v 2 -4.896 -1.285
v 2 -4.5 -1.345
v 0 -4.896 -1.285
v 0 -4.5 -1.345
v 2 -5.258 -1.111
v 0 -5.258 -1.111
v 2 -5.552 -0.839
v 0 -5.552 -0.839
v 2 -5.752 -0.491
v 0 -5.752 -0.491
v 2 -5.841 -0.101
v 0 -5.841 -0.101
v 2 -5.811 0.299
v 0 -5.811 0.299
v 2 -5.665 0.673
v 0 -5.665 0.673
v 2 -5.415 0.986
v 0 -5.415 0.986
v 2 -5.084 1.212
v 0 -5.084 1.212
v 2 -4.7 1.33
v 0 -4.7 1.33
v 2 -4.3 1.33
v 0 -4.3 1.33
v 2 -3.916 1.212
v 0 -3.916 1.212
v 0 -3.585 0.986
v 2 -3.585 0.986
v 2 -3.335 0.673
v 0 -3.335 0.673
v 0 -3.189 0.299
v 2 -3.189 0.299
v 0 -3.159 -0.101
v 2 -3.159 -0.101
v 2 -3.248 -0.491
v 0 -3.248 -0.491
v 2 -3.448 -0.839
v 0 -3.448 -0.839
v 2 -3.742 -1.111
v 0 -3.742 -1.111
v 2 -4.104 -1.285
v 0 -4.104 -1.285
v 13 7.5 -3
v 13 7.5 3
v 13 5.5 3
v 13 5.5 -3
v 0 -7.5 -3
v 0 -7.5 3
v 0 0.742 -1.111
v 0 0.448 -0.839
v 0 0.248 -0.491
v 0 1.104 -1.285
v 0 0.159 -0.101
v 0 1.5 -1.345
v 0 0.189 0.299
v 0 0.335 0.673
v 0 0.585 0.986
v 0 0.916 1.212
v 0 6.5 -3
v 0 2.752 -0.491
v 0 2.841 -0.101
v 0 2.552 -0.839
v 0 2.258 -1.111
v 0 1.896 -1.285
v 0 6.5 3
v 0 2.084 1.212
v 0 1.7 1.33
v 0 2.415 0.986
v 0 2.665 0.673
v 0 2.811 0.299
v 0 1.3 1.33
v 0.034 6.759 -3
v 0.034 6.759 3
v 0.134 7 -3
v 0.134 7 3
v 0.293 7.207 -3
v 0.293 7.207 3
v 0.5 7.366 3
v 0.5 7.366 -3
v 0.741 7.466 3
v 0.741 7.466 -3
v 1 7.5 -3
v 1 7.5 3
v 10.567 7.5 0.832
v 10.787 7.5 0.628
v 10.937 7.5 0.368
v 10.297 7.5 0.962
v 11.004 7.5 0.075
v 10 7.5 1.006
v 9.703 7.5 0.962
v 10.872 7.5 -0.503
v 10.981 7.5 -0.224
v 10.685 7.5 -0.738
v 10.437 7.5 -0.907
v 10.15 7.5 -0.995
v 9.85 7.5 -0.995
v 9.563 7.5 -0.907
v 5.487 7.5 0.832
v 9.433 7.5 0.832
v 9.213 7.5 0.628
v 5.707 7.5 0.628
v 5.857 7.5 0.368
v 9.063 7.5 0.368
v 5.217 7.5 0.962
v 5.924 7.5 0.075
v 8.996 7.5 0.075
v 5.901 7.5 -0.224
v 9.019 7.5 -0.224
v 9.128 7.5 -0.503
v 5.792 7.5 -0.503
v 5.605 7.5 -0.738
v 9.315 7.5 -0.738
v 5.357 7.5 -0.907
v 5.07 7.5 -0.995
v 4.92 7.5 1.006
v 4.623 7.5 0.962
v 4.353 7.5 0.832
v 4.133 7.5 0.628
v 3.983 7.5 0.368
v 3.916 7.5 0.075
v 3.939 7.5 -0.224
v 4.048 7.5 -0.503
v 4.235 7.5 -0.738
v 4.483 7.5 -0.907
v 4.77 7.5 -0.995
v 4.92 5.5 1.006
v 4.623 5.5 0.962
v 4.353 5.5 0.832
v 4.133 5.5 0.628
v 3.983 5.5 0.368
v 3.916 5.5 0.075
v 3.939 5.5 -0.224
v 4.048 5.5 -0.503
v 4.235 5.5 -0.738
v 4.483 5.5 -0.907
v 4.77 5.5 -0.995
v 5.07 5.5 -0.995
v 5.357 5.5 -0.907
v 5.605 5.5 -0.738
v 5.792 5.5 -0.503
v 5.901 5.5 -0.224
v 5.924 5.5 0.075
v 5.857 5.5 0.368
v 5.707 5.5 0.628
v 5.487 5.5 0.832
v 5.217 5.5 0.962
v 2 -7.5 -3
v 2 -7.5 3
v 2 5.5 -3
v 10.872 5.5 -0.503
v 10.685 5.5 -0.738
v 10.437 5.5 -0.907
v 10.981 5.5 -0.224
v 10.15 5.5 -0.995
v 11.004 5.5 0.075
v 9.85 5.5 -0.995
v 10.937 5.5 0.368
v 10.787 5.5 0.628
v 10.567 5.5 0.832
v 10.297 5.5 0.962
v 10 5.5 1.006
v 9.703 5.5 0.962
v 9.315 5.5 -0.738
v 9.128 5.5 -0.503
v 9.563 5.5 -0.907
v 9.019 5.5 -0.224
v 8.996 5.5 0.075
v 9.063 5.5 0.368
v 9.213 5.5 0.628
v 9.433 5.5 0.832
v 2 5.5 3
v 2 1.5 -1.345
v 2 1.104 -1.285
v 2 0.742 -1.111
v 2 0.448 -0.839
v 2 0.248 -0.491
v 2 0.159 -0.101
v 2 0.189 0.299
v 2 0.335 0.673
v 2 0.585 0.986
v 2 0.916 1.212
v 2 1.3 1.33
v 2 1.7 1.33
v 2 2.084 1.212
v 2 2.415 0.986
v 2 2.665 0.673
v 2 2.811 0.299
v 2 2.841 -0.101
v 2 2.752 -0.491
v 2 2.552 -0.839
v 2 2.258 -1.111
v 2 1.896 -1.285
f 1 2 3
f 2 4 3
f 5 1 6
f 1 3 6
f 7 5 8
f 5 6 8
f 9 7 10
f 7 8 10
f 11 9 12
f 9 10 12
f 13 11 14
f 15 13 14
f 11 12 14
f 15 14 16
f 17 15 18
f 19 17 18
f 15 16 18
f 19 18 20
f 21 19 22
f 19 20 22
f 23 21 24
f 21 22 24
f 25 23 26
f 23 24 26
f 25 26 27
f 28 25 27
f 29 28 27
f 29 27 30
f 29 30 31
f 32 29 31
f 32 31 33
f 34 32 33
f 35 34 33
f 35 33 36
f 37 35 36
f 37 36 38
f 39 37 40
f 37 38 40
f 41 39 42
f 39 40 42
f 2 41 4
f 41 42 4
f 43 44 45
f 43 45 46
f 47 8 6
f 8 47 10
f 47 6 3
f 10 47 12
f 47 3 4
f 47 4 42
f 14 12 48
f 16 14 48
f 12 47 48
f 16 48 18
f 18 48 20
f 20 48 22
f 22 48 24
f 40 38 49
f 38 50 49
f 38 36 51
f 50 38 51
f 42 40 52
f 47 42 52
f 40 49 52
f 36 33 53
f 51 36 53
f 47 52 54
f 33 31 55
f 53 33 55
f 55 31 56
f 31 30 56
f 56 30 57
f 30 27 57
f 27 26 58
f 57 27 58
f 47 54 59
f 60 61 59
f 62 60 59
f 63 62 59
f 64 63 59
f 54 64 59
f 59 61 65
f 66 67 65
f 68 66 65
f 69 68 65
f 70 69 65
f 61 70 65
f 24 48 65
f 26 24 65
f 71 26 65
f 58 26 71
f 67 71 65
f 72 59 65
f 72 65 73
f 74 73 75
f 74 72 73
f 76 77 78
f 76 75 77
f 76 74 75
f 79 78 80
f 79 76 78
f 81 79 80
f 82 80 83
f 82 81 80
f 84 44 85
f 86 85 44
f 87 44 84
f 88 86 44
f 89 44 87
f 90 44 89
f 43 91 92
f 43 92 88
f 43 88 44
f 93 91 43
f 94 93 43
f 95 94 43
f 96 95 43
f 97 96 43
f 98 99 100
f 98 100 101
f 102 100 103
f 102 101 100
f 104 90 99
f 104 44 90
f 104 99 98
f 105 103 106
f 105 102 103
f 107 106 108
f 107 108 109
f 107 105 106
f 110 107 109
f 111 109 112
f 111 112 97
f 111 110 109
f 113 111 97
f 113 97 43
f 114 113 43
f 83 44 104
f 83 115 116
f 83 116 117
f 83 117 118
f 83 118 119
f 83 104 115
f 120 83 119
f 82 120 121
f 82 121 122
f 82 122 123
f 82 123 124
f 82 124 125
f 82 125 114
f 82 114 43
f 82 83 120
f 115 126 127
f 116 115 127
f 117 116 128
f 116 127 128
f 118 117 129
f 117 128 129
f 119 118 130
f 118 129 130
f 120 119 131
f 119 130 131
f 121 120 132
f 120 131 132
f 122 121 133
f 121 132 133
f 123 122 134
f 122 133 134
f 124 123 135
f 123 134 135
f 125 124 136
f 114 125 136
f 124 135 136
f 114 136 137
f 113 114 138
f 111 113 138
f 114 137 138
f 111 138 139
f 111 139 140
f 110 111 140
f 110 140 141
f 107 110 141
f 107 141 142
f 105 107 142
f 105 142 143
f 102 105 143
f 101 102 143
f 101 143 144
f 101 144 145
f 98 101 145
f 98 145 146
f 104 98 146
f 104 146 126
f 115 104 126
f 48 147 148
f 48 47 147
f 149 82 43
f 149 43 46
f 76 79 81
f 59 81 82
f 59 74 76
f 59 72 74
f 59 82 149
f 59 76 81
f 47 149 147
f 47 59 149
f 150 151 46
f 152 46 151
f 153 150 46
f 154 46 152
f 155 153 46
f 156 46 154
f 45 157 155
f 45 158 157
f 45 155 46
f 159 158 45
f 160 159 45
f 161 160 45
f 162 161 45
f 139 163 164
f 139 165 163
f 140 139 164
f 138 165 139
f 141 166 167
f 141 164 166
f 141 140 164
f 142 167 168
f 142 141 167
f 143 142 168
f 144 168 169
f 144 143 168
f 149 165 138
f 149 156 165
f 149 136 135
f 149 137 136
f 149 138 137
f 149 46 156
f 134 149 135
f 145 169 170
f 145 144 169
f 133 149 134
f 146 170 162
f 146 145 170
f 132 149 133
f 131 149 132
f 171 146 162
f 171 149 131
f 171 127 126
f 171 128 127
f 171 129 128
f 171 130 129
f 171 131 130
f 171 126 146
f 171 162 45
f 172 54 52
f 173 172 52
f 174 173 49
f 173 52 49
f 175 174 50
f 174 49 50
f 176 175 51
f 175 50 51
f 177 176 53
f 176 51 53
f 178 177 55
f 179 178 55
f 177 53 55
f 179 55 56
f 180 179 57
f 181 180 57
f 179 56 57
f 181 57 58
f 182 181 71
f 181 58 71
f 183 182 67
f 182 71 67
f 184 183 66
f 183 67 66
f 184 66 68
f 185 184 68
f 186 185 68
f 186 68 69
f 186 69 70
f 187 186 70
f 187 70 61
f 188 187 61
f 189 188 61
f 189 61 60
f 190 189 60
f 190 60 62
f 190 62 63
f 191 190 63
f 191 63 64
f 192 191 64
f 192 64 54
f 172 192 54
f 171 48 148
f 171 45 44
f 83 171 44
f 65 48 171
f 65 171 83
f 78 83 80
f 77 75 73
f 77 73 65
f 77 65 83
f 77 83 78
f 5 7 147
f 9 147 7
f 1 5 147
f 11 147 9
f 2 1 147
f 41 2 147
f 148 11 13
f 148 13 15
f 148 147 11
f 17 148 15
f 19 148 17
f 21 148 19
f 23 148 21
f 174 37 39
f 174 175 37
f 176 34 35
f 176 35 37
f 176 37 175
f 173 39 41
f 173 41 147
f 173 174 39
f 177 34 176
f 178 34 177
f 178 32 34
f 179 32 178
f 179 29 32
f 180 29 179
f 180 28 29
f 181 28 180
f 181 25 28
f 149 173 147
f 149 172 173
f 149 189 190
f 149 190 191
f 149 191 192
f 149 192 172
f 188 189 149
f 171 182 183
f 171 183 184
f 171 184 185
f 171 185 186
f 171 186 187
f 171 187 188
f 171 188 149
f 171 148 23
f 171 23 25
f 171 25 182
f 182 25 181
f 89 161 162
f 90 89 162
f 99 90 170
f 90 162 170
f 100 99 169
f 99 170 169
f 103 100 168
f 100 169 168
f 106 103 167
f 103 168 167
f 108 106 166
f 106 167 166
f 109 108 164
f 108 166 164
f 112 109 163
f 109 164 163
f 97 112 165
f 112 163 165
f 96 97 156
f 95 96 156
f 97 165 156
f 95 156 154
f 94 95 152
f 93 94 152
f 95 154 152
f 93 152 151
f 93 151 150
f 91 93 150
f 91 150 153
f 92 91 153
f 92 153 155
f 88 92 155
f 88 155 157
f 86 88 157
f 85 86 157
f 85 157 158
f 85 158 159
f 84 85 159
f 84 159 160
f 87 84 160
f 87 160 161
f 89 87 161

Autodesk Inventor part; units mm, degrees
ref_plane "YZ Plane" through (0, 0, 0) normal (1, 0, 0) x (0, 1, 0)
ref_plane "XZ Plane" through (0, 0, 0) normal (0, 1, 0) x (-1, 0, 0)
ref_plane "XY Plane" through (0, 0, 0) normal (0, 0, 1) x (1, 0, 0)
sketch "Sketch1" plane through (0, 0, 0) normal (1, 0, 0) x (0, 1, 0)
  line L0 (-7.5, 3) -> (7.5, 3)
  line L1 (7.5, 3) -> (7.5, -3)
  line L2 (7.5, -3) -> (-7.5, -3)
  line L3 (-7.5, -3) -> (-7.5, 3)
  line L4 (-7.5, 3) -> (7.5, -3) construction
  line L5 (7.5, 3) -> (-7.5, -3) construction
  point P0 (0, 0)
  dimension "d0" = 15
  dimension "d1" = 6
extrude "Extrusion1" add sketch "Sketch1" along normal blind 2
sketch "Sketch2" plane through (2, 0, 0) normal (1, 0, 0) x (0, 0, -1)
  line L0 (3, 7.5) -> (-3, 7.5) projected
  line L1 (3, -7.5) -> (3, 7.5) projected
  line L2 (-3, 7.5) -> (3, 7.5)
  line L3 (3, 7.5) -> (3, 5.5)
  line L4 (3, 5.5) -> (-3, 5.5)
  line L5 (-3, 5.5) -> (-3, 7.5)
  point P0 (0, 0)
  dimension "d4" = 2
extrude "Extrusion2" add sketch "Sketch2" along normal blind 11
fillet "Fillet1" radius 1 1 edges at (0, 7.5, 0)
sketch "Sketch3" plane through (13, 7.5, 3) normal (0, 1, 0) x (1, 0, 0)
  line L0 (0, 6) -> (0, 0) construction
  line L1 (0, 3) -> (-12, 3) construction
  line L2 (-12, 0) -> (-12, 6) construction
  point P0 (-13, 3)
  point P1 (-8.08, 3)
  point P2 (-3, 3)
  dimension "d8" = 5.08
  dimension "d9" = 3
hole "Hole1" at (4.92, 7.5, 0) at (10, 7.5, 0) direction (0, -1, 0) diameter 2.013 end through all thread size "M2.5x0.45" class "6H" standard "ISO Metric profile"
sketch "Sketch4" plane through (2, 0, 0) normal (1, 0, 0) x (0, 0, -1)
  line L0 (-3, -7.5) -> (3, -7.5) construction
  line L1 (0, -7.5) -> (0, 5.5) construction
  line L2 (-3, 5.5) -> (3, 5.5) construction
  line L3 (3, 7.5) -> (-3, 7.5) construction
  point P0 (0, 0)
  point P1 (0, 1.5)
  point P2 (0, -4.5)
  dimension "d17" = 6
  dimension "d18" = 6
hole "Hole2" at (2, 1.5, 0) at (2, -4.5, 0) direction (-1, 0, 0) diameter 2.69 end through all
properties part number "bracket"
